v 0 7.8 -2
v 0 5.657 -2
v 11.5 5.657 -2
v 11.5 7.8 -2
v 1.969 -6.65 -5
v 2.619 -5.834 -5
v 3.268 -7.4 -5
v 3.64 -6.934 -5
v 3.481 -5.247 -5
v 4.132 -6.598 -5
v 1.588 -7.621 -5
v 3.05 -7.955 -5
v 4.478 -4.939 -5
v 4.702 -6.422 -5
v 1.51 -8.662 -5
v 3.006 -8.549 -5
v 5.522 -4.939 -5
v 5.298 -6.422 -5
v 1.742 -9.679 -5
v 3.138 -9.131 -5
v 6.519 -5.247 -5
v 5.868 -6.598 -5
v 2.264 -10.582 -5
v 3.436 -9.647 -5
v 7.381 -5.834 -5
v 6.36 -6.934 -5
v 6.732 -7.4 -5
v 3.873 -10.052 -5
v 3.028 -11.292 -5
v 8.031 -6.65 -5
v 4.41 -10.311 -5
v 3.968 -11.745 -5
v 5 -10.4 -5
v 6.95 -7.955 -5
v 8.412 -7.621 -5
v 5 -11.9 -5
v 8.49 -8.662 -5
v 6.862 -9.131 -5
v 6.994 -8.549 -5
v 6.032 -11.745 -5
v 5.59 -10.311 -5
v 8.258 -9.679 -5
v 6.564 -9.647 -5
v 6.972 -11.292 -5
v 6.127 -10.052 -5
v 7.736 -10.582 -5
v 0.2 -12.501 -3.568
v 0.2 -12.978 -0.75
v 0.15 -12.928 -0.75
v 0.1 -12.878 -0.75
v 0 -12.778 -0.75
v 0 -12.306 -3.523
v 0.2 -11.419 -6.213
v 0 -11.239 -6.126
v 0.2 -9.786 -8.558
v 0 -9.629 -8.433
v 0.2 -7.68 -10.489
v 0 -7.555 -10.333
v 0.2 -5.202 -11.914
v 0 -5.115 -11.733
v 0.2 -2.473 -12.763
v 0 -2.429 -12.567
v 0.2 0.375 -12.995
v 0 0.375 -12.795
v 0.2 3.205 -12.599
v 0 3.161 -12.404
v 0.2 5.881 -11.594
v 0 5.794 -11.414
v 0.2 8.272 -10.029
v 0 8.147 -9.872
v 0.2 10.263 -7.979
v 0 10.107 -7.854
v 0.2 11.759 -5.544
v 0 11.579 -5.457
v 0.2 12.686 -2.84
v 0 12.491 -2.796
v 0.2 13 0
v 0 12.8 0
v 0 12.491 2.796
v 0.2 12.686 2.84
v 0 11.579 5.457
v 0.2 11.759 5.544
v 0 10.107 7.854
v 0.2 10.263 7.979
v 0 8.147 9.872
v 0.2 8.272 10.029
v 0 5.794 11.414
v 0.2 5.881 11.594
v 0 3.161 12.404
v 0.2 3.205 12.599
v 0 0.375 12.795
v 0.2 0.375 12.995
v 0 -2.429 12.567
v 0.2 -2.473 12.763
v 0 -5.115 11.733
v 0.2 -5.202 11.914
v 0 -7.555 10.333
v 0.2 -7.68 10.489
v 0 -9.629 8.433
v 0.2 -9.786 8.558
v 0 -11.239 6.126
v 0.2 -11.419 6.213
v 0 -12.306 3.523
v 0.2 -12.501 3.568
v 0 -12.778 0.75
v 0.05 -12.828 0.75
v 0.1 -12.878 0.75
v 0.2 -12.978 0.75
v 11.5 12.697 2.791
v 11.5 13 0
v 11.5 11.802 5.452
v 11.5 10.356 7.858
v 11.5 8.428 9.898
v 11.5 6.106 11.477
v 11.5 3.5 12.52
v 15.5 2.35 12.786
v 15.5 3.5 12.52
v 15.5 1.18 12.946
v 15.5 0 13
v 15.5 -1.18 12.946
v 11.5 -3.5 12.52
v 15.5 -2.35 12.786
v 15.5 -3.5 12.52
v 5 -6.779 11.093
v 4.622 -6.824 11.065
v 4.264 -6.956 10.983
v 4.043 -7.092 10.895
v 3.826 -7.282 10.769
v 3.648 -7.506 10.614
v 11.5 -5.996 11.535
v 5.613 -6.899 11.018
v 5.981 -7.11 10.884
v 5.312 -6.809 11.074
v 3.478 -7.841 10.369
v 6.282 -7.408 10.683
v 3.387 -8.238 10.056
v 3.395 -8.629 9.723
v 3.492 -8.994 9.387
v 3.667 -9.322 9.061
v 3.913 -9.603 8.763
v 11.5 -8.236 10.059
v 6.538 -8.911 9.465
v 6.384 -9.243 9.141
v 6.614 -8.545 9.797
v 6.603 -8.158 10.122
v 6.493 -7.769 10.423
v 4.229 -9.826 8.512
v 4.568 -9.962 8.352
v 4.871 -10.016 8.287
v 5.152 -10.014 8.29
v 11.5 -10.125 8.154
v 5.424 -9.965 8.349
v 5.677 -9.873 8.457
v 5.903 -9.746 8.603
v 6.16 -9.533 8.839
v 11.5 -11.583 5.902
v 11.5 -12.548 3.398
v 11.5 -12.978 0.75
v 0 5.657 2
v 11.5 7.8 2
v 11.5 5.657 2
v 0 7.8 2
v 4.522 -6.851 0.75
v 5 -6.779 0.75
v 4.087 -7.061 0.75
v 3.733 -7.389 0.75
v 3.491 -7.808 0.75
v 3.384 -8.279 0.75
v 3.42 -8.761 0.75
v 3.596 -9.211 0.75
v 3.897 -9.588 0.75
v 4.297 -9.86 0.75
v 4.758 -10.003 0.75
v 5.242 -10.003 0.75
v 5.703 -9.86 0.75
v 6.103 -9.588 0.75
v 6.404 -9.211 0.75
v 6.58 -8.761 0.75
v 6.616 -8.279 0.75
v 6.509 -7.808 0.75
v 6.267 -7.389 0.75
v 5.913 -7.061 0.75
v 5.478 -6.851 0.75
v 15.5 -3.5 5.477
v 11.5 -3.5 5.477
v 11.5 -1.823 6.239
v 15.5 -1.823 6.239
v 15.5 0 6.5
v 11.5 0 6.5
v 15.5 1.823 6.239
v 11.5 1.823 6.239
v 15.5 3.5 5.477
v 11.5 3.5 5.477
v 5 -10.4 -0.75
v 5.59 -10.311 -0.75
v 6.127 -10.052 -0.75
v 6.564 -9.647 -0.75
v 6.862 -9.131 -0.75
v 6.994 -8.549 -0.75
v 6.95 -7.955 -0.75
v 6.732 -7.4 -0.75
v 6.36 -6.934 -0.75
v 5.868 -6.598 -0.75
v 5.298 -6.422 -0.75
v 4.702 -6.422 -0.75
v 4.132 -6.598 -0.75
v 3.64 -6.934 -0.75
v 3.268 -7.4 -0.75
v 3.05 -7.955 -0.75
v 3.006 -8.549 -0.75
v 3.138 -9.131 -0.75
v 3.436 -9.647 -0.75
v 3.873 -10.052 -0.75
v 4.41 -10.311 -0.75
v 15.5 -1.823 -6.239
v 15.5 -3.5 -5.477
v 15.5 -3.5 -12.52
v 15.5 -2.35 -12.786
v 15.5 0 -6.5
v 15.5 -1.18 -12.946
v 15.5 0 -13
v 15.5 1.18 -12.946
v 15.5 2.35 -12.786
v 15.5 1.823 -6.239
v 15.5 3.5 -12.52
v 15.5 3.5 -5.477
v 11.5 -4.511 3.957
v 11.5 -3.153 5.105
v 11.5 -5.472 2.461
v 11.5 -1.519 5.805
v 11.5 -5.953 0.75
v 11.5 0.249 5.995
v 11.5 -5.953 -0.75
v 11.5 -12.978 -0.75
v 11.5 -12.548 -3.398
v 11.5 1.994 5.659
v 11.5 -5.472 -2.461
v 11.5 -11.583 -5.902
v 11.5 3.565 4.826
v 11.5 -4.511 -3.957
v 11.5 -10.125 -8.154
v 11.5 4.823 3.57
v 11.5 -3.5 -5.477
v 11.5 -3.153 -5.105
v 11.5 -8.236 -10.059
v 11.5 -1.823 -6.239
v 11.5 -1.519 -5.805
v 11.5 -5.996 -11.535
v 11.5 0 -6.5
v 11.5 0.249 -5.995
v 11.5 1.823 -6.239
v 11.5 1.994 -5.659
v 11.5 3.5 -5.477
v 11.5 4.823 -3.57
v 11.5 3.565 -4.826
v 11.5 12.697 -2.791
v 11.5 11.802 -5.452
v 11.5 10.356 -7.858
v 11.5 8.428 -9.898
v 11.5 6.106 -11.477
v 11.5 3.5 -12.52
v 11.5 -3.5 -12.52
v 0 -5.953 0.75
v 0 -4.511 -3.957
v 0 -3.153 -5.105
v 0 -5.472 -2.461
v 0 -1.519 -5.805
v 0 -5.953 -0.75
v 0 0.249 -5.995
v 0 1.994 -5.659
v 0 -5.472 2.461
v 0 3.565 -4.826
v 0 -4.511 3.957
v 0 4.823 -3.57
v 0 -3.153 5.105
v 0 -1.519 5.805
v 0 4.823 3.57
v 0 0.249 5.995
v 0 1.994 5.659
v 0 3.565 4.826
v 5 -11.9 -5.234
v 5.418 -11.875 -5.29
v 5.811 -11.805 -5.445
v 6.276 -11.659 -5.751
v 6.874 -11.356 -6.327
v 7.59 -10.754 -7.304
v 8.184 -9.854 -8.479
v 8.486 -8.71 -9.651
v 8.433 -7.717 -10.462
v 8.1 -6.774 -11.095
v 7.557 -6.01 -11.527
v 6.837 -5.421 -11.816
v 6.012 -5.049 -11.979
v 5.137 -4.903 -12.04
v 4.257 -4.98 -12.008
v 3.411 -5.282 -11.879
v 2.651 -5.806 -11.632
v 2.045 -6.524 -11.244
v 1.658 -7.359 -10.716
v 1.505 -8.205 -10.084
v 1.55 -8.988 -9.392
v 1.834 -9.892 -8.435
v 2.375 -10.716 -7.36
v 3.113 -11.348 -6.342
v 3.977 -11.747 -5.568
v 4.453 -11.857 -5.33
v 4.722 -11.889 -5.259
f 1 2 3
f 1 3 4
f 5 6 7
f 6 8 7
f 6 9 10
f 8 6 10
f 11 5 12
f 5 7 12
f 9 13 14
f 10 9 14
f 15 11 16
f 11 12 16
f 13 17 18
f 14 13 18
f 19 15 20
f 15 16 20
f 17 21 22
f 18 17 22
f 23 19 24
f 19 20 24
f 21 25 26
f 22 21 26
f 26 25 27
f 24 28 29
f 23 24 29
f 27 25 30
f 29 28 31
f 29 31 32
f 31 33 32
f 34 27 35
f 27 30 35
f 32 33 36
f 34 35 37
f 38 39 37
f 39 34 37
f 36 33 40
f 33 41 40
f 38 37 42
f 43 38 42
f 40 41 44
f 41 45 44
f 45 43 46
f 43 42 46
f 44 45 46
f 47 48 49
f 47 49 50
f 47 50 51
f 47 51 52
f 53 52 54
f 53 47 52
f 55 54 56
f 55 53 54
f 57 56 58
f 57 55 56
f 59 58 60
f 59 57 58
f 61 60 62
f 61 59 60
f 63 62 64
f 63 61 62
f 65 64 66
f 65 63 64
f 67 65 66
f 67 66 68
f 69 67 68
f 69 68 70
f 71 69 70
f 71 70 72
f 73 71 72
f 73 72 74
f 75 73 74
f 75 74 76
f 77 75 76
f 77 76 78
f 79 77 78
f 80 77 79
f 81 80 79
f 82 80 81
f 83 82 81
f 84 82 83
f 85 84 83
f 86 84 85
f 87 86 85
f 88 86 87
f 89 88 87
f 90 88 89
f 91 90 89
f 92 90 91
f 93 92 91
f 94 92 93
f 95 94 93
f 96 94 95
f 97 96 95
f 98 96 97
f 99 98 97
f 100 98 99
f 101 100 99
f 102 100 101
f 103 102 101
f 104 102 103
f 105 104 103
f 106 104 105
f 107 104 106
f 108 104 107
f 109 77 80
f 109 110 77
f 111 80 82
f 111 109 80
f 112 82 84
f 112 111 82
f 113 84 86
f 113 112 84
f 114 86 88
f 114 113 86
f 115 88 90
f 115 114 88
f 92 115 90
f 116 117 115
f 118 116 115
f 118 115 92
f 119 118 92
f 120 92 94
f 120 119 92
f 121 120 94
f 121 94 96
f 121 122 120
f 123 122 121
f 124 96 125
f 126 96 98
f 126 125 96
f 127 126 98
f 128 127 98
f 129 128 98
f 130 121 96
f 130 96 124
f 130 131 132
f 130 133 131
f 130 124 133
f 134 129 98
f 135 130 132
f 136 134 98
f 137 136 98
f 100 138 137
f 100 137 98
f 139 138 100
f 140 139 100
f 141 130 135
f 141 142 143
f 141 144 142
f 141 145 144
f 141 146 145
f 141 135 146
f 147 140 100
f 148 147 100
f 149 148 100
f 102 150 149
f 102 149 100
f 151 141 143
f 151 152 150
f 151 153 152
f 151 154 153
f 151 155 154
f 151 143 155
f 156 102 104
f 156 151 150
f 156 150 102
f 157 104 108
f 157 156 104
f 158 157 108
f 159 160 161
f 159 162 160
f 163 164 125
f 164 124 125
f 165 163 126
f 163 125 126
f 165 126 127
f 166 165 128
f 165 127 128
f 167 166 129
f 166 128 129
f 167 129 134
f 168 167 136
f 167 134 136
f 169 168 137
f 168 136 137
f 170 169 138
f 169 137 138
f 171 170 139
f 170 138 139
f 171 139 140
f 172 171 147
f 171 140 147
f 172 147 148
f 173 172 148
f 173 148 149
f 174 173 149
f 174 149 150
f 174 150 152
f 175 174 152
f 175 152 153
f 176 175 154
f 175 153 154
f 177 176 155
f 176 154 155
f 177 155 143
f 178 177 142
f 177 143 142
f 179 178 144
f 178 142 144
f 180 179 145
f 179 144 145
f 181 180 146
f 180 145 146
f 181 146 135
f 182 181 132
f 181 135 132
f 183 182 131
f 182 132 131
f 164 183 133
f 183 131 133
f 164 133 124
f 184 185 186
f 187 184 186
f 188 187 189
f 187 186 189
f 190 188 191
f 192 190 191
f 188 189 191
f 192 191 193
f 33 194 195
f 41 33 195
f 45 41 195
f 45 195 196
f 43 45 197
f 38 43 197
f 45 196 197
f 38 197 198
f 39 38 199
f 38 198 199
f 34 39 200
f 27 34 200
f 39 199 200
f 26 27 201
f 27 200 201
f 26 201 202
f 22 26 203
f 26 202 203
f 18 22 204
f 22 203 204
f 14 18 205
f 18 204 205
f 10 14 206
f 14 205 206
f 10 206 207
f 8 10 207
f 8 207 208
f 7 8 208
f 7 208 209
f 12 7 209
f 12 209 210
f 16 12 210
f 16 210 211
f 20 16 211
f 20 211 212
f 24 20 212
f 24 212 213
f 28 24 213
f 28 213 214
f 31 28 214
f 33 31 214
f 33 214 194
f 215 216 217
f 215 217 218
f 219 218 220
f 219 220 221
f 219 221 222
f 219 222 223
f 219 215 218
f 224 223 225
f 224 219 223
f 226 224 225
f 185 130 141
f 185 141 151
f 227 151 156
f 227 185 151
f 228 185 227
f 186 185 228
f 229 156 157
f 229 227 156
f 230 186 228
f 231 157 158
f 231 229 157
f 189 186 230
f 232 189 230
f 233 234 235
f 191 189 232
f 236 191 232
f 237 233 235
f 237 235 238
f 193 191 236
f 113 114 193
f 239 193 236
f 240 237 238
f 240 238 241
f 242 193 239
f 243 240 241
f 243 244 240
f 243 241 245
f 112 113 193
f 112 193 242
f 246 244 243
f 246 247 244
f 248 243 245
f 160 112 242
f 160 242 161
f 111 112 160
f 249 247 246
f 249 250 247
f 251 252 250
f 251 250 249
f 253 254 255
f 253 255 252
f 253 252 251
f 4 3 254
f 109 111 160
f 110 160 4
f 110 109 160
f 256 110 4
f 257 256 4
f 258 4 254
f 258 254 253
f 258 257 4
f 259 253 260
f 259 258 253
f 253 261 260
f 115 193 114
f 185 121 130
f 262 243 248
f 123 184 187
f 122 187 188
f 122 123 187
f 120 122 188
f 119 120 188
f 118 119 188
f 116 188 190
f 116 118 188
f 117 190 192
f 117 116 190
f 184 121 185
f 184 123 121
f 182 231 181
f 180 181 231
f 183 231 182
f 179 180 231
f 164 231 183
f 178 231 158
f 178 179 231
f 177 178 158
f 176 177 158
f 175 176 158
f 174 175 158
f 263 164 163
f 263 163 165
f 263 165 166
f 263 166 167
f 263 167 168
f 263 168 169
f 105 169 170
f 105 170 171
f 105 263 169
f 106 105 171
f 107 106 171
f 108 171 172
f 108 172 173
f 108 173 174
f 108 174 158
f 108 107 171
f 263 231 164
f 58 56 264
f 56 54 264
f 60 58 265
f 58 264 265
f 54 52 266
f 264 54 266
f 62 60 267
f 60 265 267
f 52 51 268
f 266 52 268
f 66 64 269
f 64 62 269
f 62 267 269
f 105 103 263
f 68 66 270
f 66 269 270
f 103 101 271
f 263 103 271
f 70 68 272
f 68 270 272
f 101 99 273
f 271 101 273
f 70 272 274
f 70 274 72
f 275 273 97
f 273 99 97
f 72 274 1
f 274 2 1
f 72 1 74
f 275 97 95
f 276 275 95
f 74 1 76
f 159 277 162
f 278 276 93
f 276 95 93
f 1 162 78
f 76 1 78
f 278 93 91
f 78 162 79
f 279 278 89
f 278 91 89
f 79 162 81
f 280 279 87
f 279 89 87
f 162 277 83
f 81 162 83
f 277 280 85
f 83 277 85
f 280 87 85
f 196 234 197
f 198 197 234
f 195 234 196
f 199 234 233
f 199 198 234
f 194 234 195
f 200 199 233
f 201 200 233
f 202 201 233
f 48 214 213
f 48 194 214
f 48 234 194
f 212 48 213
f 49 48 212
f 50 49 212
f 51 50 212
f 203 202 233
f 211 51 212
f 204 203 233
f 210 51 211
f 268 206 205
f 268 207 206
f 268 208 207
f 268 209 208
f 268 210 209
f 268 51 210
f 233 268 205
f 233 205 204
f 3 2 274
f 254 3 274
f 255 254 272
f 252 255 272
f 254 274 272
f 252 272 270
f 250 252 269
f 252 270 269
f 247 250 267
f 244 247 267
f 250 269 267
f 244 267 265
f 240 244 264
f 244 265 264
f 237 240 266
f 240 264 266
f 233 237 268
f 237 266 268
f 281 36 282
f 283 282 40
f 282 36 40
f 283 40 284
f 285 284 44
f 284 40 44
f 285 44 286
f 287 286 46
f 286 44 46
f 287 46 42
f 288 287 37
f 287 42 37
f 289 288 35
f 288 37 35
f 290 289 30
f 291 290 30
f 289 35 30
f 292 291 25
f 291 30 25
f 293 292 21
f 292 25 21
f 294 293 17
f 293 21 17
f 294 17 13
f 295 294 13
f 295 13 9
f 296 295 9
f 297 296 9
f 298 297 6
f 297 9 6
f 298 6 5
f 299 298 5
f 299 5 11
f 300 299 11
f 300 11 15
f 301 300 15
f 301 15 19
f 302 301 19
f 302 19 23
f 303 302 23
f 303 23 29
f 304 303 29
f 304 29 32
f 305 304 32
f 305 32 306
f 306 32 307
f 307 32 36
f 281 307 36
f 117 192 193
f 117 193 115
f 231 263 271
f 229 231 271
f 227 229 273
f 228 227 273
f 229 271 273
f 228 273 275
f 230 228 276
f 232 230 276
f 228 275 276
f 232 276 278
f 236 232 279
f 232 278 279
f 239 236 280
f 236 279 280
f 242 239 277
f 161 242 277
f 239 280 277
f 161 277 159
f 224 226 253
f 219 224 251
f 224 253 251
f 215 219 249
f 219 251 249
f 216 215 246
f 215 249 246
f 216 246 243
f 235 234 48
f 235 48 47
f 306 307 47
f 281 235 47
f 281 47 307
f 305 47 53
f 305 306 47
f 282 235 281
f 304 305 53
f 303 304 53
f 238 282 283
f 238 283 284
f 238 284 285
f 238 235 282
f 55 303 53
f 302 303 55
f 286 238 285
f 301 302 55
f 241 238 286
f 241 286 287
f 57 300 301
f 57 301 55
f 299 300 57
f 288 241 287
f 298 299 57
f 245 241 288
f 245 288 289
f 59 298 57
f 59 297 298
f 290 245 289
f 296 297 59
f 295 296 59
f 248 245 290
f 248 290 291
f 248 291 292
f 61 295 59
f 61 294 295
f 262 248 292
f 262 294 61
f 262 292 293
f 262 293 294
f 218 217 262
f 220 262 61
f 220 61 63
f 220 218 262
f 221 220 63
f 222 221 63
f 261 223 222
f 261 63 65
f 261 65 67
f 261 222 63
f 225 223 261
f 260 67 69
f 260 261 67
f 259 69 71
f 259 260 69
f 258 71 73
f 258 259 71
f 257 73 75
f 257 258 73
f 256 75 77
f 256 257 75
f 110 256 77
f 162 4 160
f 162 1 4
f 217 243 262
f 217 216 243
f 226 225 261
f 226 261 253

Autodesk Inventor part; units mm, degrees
sketch "Sketch_1" plane through (0, 0, 0) normal (0, 0, 1) x (1, 0, 0)
  line L0 (15.5, 0) -> (0, 0)
  line L1 (0, 0) -> (0, 12.8)
  line L2 (0, 12.8) -> (0.2, 13)
  line L3 (0.2, 13) -> (15.5, 13)
  line L4 (15.5, 13) -> (15.5, 0)
  line L5 (15.5, 0) -> (0, 0)
revolve "Revolution1" add sketch "Sketch_1" angle 360 about axis through (15.5, 0, 0) along (1, 0, 0)
sketch "Sketch_6" plane through (0, 0, 0) normal (1, 0, 0) x (0, 1, 0)
  line L0 (-13, 0.75) -> (-13, -0.75)
  line L1 (-13, -0.75) -> (0, -0.75)
  line L2 (0, -0.75) -> (0, 0.75)
  line L3 (0, 0.75) -> (-13, 0.75)
extrude "Extrusion1" cut sketch "Sketch_6" along normal blind 11.5
sketch "Sketch_7" plane through (5, 0, 0) normal (1, 0, 0) x (0, 0, -1)
  line L0 (-13, -8.4) -> (13, -8.4)
  line L1 (13, -8.4) -> (13, -11.9)
  line L2 (13, -11.9) -> (5, -11.9)
  line L3 (5, -11.9) -> (5, -10.4)
  line L4 (5, -10.4) -> (0.75, -10.4)
  line L5 (0.75, -10.4) -> (0.75, -8.4)
  line L6 (0.75, -8.4) -> (13, -8.4)
revolve "Revolution2" cut sketch "Sketch_7" angle 360 about axis through (5, -8.4, 13) along (0, 0, 1)
sketch "Sketch4" plane through (11.5, 0, 0.75) normal (0, 0, -1) x (-1, 0, 0)
  point P0 (6.5, -8.4)
hole "Hole1" at (5, -8.4, 0.75) direction (0, 0, 1) diameter 3.242 depth 12.25 thread size "M4x0.7" class "6H" standard "ISO Metric profile"
sketch "Sketch_2" plane through (15.5, 0, 0) normal (1, 0, 0) x (0, 0, -1)
  line L0 (-14, -13.5) -> (14, -13.5)
  line L1 (14, -13.5) -> (14, 13.5)
  line L2 (14, 13.5) -> (-14, 13.5)
  line L3 (-14, 13.5) -> (-14, -13.5)
  line L4 (-13, -3.5) -> (13, -3.5)
  line L5 (13, -3.5) -> (13, 3.5)
  line L6 (13, 3.5) -> (-13, 3.5)
  line L7 (-13, 3.5) -> (-13, -3.5)
extrude "Extrusion2" cut sketch "Sketch_2" against normal blind 4
sketch "Sketch6" plane through (15.5, 0, 0) normal (1, 0, 0) x (0, 0, -1)
  point P0 (0, 0)
hole "Hole2" at (15.5, 0, 0) direction (-1, 0, 0) diameter 13 depth 4
sketch "Sketch_15" plane through (11.5, 0, 0) normal (1, 0, 0) x (0, 0, -1)
  arc A0 (-2, 5.6569) -> (2, 5.6569) centre (0, 0) ccw
  line L0 (2, 5.6569) -> (2, 7.8)
  line L1 (2, 7.8) -> (-2, 7.8)
  line L2 (-2, 7.8) -> (-2, 5.6569)
extrude "Extrusion3" cut sketch "Sketch_15" along normal mid plane 31
ref_plane "L_XY" through (15.2, 0, 0) normal (1, 0, 0) x (0, 0, -1)
ref_plane "L_YZ" through (15.2, 0, 0) normal (0, 0, -1) x (0, 1, 0)
ref_plane "L_ZX" through (15.2, 0, 0) normal (0, 1, 0) x (1, 0, 0)
ref_plane "screw_XY" through (5, -8.4, -5) normal (0, 0, -1) x (1, 0, 0)
ref_plane "screw_YZ" through (5, -8.4, -5) normal (1, 0, 0) x (0, -1, 0)
ref_plane "screw_ZX" through (5, -8.4, -5) normal (0, -1, 0) x (0, 0, -1)
properties part number "MCOCWK26-12_c"
